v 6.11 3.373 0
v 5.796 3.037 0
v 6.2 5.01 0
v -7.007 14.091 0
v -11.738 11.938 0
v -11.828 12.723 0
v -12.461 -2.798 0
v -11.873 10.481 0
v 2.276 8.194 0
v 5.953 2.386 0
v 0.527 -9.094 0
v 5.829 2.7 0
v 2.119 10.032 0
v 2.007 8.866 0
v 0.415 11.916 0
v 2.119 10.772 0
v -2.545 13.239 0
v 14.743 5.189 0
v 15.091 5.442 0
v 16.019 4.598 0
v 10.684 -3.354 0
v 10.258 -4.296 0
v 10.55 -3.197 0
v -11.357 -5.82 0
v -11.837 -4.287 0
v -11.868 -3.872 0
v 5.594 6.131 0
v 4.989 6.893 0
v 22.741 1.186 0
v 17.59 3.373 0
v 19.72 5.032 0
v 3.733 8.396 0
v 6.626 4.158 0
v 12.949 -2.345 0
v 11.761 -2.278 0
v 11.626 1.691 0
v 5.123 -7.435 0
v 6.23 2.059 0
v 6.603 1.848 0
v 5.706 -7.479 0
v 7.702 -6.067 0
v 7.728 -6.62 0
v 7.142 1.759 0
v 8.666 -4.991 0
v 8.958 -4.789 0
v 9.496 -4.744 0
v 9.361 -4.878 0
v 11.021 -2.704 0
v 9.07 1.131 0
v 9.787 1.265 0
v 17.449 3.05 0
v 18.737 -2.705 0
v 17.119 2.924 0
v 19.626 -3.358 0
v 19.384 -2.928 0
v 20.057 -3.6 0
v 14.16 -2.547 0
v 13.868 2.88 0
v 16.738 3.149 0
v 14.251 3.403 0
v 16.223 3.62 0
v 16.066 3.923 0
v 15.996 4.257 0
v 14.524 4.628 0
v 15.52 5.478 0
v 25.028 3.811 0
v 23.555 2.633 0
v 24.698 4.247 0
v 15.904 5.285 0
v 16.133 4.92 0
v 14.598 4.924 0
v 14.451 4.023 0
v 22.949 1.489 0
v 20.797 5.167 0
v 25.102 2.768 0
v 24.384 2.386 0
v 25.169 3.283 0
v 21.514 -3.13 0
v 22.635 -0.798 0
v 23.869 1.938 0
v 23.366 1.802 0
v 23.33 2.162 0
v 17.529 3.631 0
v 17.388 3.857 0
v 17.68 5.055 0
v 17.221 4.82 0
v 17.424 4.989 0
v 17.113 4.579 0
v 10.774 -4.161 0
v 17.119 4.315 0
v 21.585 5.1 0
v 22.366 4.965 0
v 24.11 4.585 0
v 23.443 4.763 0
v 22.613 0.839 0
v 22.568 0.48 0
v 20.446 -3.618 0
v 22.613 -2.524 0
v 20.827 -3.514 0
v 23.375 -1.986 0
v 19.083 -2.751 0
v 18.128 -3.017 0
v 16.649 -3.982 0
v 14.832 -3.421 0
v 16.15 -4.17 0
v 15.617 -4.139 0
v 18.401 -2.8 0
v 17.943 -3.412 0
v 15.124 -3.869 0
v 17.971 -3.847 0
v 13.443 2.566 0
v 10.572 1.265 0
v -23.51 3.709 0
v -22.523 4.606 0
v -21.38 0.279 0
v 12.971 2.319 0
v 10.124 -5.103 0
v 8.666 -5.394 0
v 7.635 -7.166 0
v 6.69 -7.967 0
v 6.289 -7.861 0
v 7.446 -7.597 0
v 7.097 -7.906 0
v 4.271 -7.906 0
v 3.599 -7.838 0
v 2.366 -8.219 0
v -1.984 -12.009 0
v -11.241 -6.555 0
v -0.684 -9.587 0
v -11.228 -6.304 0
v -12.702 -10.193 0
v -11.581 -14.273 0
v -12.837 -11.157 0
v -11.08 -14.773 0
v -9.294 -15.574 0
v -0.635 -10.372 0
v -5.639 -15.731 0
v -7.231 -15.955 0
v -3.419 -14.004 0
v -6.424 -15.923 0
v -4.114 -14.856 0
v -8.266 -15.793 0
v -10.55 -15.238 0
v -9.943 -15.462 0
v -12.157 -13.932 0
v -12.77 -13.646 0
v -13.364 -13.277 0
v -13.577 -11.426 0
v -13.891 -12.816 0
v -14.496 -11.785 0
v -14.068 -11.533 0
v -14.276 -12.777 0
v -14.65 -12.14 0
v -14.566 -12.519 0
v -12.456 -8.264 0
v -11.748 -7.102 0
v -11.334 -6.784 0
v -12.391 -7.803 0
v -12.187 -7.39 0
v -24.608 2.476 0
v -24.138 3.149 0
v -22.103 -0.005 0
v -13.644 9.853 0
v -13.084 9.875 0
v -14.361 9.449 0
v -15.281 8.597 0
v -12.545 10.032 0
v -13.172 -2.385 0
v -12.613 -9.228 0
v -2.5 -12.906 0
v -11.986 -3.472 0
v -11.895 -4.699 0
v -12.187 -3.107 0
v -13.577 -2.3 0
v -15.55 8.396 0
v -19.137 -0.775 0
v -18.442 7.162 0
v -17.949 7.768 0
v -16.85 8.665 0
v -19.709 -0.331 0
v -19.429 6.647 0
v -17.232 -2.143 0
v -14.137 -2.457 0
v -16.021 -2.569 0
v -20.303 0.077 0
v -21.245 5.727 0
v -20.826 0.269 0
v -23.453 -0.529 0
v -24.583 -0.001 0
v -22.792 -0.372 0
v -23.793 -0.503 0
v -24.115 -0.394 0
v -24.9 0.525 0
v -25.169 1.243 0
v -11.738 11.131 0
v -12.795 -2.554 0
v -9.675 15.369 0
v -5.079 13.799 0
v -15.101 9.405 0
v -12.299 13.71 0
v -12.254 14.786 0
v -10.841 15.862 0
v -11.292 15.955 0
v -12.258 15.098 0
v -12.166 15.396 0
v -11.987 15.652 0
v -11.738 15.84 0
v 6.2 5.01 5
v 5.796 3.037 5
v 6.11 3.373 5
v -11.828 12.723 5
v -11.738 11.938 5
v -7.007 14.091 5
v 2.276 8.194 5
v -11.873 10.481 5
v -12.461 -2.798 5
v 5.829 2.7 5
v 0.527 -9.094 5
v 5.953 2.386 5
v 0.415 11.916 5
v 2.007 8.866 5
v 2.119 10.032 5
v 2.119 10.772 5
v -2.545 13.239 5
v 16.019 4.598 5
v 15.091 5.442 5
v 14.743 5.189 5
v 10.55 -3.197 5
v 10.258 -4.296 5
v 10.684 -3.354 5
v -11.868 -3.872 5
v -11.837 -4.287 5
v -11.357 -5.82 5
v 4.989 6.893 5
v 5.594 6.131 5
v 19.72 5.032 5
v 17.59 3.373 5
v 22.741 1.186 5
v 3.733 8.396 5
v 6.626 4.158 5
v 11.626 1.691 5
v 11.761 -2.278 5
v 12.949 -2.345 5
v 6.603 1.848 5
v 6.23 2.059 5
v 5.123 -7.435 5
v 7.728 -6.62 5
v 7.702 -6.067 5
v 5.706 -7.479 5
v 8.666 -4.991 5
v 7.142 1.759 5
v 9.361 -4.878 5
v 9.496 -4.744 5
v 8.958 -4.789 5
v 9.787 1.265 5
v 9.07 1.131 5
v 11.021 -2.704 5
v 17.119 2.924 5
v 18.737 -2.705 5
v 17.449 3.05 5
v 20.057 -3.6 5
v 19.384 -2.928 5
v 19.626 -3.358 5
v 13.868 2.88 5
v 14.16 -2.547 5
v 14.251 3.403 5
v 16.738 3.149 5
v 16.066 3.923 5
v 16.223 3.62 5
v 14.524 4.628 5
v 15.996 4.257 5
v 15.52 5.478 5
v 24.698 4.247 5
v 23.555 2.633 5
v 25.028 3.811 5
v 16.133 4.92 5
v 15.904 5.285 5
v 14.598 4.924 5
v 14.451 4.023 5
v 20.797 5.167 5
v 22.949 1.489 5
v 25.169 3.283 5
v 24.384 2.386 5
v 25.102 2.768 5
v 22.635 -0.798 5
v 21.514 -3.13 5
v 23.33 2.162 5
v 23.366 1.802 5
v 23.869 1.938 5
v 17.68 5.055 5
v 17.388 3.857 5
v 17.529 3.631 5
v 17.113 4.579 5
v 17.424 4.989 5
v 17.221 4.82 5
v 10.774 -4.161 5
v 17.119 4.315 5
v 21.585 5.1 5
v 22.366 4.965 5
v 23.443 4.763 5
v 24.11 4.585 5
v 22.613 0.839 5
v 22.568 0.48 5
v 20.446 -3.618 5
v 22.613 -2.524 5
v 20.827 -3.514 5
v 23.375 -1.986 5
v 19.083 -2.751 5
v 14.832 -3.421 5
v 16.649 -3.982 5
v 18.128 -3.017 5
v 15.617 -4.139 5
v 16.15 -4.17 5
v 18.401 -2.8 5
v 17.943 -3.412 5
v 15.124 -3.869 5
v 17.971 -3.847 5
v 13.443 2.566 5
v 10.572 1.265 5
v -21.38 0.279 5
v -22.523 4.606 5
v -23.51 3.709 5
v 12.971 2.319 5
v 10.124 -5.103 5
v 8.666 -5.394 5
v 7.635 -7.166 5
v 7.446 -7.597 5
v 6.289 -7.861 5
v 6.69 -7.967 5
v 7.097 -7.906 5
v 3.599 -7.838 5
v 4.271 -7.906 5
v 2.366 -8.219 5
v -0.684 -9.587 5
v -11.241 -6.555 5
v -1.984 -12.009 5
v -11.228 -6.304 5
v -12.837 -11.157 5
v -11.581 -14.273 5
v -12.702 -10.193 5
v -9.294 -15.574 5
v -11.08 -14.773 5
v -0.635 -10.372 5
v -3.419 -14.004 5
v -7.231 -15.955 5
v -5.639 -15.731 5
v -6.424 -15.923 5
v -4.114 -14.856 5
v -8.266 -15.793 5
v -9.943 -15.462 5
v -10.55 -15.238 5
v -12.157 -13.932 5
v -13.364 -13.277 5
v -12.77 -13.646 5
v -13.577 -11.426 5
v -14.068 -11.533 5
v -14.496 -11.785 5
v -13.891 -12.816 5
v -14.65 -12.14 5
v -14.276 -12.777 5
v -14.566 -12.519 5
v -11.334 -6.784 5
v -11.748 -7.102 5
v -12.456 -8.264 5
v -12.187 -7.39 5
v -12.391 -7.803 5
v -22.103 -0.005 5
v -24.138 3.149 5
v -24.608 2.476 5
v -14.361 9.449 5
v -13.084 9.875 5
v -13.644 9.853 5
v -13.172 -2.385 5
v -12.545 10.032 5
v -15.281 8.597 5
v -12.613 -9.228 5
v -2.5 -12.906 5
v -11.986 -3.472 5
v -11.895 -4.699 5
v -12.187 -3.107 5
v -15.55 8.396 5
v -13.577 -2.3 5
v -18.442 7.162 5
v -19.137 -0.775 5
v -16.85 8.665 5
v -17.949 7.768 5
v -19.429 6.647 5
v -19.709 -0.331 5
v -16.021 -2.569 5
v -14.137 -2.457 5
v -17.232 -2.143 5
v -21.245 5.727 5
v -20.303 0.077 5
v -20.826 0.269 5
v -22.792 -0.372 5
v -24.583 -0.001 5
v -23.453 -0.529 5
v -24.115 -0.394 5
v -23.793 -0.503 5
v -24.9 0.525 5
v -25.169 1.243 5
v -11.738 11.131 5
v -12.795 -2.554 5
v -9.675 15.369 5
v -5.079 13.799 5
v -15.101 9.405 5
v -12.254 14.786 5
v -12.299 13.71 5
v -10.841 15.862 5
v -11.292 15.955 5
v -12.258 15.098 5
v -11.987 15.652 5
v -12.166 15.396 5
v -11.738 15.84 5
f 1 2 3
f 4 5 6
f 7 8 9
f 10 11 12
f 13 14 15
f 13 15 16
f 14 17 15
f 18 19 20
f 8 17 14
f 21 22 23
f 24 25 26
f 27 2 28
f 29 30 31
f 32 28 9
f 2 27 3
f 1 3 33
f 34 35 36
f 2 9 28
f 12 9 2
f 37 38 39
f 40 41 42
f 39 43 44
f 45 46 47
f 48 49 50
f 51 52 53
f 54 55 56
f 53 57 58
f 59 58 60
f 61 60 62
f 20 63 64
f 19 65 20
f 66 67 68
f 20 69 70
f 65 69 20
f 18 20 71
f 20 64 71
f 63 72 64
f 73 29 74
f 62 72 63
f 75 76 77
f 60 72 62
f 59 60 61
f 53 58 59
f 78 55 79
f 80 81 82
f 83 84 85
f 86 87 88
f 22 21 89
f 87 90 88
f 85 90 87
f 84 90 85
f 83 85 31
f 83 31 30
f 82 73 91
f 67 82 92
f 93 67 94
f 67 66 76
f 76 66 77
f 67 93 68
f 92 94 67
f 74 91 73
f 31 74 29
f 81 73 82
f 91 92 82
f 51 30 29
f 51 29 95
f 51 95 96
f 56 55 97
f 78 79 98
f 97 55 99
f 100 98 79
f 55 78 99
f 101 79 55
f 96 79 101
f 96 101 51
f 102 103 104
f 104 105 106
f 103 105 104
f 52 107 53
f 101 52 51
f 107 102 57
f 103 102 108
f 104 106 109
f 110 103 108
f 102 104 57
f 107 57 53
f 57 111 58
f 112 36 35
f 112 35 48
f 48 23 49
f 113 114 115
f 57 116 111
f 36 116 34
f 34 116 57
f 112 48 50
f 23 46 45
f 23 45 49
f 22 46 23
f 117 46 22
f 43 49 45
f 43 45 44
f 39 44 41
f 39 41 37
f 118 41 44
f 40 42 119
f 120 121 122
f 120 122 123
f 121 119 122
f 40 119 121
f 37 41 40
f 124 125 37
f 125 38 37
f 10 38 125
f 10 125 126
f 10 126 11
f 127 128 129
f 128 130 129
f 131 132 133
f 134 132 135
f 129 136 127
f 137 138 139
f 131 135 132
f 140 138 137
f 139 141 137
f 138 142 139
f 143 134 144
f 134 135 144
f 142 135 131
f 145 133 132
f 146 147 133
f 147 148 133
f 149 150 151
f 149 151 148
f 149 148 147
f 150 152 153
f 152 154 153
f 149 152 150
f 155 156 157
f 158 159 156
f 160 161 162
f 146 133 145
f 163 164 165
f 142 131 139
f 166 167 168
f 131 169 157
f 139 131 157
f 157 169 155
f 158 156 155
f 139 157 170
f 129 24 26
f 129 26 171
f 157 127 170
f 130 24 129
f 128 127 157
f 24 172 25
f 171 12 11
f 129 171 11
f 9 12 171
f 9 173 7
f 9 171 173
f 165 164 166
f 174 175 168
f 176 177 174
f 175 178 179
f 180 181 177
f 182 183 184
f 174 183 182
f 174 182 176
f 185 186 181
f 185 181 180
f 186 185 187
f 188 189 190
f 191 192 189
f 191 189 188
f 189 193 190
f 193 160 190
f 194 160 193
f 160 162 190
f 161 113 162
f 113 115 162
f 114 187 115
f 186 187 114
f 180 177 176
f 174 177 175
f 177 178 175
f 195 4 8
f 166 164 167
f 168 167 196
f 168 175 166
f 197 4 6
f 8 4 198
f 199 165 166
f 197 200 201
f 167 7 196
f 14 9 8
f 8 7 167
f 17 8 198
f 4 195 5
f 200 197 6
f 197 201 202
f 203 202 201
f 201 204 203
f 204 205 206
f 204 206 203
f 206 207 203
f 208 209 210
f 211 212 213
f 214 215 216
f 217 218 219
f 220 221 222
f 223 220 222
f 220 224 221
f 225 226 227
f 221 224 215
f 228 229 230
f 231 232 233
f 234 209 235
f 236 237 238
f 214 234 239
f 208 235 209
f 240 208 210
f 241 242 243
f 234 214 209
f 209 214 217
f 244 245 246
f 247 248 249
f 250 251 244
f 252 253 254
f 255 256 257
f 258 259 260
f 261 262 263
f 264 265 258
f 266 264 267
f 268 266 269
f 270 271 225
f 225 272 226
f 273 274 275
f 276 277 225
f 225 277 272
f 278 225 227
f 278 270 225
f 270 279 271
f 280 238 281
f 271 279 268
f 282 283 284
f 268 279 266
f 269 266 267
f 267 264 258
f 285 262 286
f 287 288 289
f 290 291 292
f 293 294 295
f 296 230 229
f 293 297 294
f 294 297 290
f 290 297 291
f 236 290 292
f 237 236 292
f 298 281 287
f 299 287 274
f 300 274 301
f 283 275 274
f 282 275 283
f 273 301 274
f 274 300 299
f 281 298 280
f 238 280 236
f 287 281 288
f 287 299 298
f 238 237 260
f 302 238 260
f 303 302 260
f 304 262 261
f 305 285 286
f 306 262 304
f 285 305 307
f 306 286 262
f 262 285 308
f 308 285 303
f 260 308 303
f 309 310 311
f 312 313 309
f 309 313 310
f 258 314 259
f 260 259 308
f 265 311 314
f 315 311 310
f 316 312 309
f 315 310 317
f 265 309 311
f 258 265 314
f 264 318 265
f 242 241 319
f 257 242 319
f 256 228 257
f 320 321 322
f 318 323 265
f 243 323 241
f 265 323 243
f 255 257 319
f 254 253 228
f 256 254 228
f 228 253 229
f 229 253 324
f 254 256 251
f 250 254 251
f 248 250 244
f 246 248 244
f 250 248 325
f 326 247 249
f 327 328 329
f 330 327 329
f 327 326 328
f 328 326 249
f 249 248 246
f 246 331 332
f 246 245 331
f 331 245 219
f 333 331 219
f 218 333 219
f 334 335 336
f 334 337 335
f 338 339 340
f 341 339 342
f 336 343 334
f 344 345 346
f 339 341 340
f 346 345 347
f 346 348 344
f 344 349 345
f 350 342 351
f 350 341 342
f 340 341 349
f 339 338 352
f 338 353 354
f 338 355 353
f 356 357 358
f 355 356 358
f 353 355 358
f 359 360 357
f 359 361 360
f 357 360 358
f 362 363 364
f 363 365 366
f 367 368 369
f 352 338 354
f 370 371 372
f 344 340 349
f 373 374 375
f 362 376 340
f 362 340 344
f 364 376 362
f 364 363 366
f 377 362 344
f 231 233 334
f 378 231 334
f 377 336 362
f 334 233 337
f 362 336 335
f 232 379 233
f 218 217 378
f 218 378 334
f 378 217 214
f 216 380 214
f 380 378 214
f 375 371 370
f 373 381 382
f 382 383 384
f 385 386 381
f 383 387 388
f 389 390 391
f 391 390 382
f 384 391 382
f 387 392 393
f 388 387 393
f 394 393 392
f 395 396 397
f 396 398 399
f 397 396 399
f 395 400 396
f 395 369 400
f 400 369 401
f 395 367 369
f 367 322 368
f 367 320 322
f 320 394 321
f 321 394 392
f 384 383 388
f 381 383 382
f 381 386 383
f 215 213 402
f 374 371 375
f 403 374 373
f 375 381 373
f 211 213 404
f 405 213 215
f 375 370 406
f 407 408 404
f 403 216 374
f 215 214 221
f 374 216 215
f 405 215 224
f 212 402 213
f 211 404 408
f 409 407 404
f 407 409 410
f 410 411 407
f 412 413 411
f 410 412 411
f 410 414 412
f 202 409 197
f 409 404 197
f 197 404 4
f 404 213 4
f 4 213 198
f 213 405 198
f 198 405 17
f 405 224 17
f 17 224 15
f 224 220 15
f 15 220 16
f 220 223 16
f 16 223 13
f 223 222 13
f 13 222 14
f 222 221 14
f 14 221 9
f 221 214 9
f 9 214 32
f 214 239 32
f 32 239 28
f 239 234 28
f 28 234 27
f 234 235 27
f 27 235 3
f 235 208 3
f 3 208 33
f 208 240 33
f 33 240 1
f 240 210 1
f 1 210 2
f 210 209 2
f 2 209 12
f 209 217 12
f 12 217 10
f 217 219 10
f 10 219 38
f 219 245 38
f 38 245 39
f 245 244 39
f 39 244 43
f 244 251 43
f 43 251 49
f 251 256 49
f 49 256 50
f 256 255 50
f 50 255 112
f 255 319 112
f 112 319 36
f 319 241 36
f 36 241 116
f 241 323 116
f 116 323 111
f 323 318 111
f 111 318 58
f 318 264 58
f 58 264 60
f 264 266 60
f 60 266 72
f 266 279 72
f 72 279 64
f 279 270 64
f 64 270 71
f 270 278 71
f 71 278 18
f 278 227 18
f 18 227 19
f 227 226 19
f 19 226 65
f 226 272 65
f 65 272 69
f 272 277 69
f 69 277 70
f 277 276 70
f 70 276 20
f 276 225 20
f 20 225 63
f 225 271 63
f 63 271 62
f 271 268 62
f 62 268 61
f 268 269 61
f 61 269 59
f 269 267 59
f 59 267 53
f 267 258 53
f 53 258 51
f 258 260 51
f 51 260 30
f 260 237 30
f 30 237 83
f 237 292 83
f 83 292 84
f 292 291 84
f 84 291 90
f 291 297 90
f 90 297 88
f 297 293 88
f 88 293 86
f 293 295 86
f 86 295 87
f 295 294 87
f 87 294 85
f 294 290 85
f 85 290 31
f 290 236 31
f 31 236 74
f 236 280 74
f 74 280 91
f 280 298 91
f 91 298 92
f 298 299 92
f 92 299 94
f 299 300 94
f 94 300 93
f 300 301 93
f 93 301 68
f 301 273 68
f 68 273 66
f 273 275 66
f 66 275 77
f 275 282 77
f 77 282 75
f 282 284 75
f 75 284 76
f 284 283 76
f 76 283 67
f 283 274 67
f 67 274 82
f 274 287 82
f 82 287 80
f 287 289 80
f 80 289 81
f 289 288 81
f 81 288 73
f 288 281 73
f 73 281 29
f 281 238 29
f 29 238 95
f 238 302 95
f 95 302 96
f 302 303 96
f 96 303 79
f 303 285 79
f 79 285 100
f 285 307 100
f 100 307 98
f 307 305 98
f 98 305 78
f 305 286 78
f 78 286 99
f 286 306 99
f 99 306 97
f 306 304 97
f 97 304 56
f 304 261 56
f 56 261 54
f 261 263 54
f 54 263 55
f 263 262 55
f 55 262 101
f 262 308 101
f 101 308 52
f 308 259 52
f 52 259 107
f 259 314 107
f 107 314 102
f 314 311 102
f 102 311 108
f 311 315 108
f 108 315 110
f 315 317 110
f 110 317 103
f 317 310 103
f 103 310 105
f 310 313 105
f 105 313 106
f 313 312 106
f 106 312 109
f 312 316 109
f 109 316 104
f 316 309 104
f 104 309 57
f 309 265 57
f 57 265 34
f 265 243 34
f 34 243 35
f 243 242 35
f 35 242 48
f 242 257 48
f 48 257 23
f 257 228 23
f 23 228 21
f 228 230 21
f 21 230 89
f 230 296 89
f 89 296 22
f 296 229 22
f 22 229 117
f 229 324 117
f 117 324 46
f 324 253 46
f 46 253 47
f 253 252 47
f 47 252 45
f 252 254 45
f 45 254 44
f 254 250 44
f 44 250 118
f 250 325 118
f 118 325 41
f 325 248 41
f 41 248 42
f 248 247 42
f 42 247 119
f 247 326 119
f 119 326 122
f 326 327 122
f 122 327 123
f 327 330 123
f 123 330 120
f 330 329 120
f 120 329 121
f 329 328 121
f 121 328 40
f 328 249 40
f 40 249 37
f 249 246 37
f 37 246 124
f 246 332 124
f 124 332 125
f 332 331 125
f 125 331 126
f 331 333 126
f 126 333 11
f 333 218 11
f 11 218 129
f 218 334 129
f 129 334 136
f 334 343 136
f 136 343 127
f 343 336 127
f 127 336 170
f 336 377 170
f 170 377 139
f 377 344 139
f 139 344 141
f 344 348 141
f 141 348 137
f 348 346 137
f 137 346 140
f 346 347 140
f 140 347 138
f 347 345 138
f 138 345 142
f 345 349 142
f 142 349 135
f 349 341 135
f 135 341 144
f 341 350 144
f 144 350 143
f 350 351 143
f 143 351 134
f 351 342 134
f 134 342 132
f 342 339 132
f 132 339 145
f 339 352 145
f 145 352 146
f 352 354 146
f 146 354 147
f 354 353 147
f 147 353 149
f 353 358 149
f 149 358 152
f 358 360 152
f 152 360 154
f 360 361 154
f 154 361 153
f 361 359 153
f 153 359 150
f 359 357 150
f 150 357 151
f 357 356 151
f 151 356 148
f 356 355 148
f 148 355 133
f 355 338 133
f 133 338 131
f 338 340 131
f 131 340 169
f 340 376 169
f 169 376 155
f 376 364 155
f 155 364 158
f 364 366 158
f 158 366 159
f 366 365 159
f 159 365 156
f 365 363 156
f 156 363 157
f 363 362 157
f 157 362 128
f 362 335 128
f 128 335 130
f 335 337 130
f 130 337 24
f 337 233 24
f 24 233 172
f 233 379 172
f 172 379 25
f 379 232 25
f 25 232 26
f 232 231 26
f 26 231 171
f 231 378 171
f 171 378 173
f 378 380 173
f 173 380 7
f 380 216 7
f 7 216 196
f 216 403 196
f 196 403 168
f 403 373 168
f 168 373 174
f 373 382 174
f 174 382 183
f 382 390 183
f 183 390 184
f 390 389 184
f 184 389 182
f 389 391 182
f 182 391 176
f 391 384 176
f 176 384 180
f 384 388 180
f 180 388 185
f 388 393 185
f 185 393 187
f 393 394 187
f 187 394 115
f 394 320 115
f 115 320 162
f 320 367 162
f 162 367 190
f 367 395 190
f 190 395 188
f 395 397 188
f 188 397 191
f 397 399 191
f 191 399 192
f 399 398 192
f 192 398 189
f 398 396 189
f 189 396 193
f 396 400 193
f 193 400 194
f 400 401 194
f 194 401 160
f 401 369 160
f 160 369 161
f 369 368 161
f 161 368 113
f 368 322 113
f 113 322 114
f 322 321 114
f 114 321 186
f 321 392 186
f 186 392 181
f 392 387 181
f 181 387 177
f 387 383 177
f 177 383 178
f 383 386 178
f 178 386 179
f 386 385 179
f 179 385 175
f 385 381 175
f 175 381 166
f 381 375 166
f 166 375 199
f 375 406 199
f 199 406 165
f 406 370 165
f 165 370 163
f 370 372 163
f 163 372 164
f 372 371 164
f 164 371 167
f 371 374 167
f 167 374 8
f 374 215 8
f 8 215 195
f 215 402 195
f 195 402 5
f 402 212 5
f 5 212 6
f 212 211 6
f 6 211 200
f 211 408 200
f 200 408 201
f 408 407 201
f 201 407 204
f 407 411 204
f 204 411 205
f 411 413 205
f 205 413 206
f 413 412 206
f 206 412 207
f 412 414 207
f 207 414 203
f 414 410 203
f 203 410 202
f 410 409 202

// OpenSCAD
// Module names are of the form poly_<inkscape-path-id>().  As a result,
// you can associate a polygon in this OpenSCAD program with the corresponding
// SVG element in the Inkscape document by looking for the XML element with
// the attribute id="inkscape-path-id".

// fudge value is used to ensure that subtracted solids are a tad taller
// in the z dimension than the polygon being subtracted from.  This helps
// keep the resulting .stl file manifold.
fudge = 0.1;

module poly_path3099(h)
{
  scale([25.4/90, -25.4/90, 1]) union()
  {
    linear_extrude(height=h)
      polygon([[32.137172,-4.006373],[25.304552,-6.230950],[23.397772,-6.548746],[22.074236,-7.294880],[21.093742,-8.455526],[20.652780,-9.568219],[20.537602,-10.759551],[21.649892,-11.951288],[23.477222,-14.732009],[21.967682,-17.751076],[19.822562,-21.723534],[17.677432,-24.424805],[13.228282,-29.747898],[8.064088,-29.032856],[7.110698,-31.416330],[7.507944,-35.547686],[7.507944,-38.169508],[1.469809,-42.221415],[-9.017479,-46.908915],[-17.995233,-48.895143],[-24.827860,-49.927982],[-34.282309,-54.456584],[-38.413665,-56.204465],[-40.011876,-56.533875],[-41.591631,-56.125015],[-42.473603,-55.458155],[-43.109631,-54.553698],[-43.433557,-53.496510],[-43.418961,-52.390905],[-43.577860,-48.577346],[-41.909428,-45.081583],[-41.591631,-42.300863],[-41.591631,-39.440693],[-42.068326,-37.136668],[-44.451800,-35.547685],[-46.358995,-34.989119],[-48.344809,-34.912092],[-50.887182,-33.482007],[-53.509004,-33.323109],[-54.144597,-30.462939],[-55.097987,-29.747897],[-59.706036,-30.701286],[-63.599045,-27.523320],[-65.346926,-25.378193],[-68.842689,-23.550862],[-75.278070,-20.293447],[-79.806672,-16.320989],[-83.302435,-13.143023],[-85.527011,-11.156794],[-87.195443,-8.773320],[-89.181672,-4.403616],[-88.228282,-1.861243],[-87.105615,0.003833],[-85.447562,1.396172],[-84.306894,1.783421],[-83.101783,1.872875],[-80.760062,1.316722],[-78.318089,0.019093],[-75.754765,-0.987304],[-73.793978,-0.952139],[-71.941206,-0.272261],[-69.834734,1.172596],[-67.809850,2.746806],[-61.056672,7.593205],[-56.766418,9.102739],[-50.092689,8.705493],[-48.106460,8.149349],[-46.673112,8.450251],[-45.335882,9.049585],[-44.152479,9.913844],[-43.180613,11.009518],[-42.470174,12.302285],[-42.053035,13.718062],[-41.941475,15.189791],[-42.147774,16.650410],[-40.240994,20.622870],[-39.785467,22.336139],[-39.829533,23.224678],[-40.161544,24.039180],[-41.627052,25.165151],[-43.180612,26.184310],[-43.903588,27.649174],[-44.134001,29.282820],[-44.690145,32.699140],[-45.007942,36.115450],[-45.484637,39.531770],[-48.106459,40.485160],[-49.847015,40.865556],[-51.363874,41.756340],[-51.908732,43.017435],[-51.611744,44.358705],[-50.585449,45.271905],[-49.218747,45.410995],[-47.353169,47.043844],[-45.246290,48.350615],[-43.077250,49.363980],[-41.035484,50.575195],[-39.261322,52.344575],[-37.380823,53.991505],[-35.230661,54.788124],[-32.931671,55.183245],[-29.288628,55.959555],[-25.622349,56.533875],[-22.762224,56.418360],[-19.981459,55.739385],[-14.578916,52.640875],[-12.115993,49.621805],[-8.858577,45.728795],[-7.031247,42.550830],[-2.250526,36.751040],[-2.423196,33.970320],[1.867058,32.222440],[8.381889,29.123930],[12.751592,27.773290],[15.135072,28.011640],[18.154142,26.343210],[20.219812,26.502100],[22.285492,27.852740],[23.704082,28.229635],[25.145662,28.011640],[26.385082,26.918428],[27.052442,25.389820],[27.382168,23.456206],[27.290792,21.496810],[30.707092,19.113330],[30.707092,17.683250],[31.739932,16.968210],[33.170022,17.286000],[33.646722,16.809310],[35.871302,18.080490],[36.347992,15.220320],[38.175322,14.743630],[37.857532,11.883459],[37.380832,11.327315],[39.049252,9.579434],[41.671082,8.069900],[45.881882,8.308247],[50.172142,9.023289],[52.555612,12.121806],[53.588452,13.710790],[55.336332,14.664180],[57.222882,14.775285],[58.990992,14.108040],[63.678492,13.631340],[63.576852,12.089693],[64.234642,10.691722],[65.201215,9.919957],[66.391392,9.583251],[67.617340,9.747377],[68.683792,10.373925],[69.542562,11.898630],[71.067262,12.757400],[72.447828,12.818616],[73.796662,12.449553],[76.231462,11.088967],[80.124472,8.943840],[82.825742,7.037061],[80.203922,2.826256],[79.965572,-1.702346],[80.124472,-2.973533],[80.577503,-4.200742],[81.316202,-5.277558],[82.792587,-6.384316],[84.573622,-6.866541],[82.666842,-7.661033],[83.461332,-9.329465],[86.400952,-8.455524],[88.943322,-9.806160],[89.181672,-11.633490],[88.683345,-13.504925],[87.513242,-15.049804],[85.429377,-16.244572],[83.064082,-16.877134],[79.250532,-17.592177],[76.481335,-18.072223],[73.689082,-18.307219],[69.875532,-17.830524],[62.645652,-17.909974],[61.738908,-17.677423],[61.019192,-17.078869],[60.637823,-16.223990],[60.659422,-15.288152],[61.610472,-13.665924],[62.111562,-12.864529],[62.327862,-11.951288],[61.826172,-10.807642],[60.659422,-10.362305],[59.308792,-11.156796],[57.481462,-12.825229],[56.925396,-13.900161],[56.677662,-15.084778],[56.760425,-16.292188],[57.163662,-17.433279],[56.354072,-18.725458],[54.990782,-19.408538],[53.471072,-19.283458],[52.237812,-18.386669],[51.725882,-17.446881],[51.462262,-16.397799],[51.204972,-14.255313],[50.496490,-12.057801],[49.139302,-10.203407],[47.633072,-9.091050],[45.961332,-8.217178],[41.194382,-5.992601],[37.460272,-4.483068],[34.679552,-4.483068],[32.137172,-4.006373]]);
  }
}

poly_path3099(5);
